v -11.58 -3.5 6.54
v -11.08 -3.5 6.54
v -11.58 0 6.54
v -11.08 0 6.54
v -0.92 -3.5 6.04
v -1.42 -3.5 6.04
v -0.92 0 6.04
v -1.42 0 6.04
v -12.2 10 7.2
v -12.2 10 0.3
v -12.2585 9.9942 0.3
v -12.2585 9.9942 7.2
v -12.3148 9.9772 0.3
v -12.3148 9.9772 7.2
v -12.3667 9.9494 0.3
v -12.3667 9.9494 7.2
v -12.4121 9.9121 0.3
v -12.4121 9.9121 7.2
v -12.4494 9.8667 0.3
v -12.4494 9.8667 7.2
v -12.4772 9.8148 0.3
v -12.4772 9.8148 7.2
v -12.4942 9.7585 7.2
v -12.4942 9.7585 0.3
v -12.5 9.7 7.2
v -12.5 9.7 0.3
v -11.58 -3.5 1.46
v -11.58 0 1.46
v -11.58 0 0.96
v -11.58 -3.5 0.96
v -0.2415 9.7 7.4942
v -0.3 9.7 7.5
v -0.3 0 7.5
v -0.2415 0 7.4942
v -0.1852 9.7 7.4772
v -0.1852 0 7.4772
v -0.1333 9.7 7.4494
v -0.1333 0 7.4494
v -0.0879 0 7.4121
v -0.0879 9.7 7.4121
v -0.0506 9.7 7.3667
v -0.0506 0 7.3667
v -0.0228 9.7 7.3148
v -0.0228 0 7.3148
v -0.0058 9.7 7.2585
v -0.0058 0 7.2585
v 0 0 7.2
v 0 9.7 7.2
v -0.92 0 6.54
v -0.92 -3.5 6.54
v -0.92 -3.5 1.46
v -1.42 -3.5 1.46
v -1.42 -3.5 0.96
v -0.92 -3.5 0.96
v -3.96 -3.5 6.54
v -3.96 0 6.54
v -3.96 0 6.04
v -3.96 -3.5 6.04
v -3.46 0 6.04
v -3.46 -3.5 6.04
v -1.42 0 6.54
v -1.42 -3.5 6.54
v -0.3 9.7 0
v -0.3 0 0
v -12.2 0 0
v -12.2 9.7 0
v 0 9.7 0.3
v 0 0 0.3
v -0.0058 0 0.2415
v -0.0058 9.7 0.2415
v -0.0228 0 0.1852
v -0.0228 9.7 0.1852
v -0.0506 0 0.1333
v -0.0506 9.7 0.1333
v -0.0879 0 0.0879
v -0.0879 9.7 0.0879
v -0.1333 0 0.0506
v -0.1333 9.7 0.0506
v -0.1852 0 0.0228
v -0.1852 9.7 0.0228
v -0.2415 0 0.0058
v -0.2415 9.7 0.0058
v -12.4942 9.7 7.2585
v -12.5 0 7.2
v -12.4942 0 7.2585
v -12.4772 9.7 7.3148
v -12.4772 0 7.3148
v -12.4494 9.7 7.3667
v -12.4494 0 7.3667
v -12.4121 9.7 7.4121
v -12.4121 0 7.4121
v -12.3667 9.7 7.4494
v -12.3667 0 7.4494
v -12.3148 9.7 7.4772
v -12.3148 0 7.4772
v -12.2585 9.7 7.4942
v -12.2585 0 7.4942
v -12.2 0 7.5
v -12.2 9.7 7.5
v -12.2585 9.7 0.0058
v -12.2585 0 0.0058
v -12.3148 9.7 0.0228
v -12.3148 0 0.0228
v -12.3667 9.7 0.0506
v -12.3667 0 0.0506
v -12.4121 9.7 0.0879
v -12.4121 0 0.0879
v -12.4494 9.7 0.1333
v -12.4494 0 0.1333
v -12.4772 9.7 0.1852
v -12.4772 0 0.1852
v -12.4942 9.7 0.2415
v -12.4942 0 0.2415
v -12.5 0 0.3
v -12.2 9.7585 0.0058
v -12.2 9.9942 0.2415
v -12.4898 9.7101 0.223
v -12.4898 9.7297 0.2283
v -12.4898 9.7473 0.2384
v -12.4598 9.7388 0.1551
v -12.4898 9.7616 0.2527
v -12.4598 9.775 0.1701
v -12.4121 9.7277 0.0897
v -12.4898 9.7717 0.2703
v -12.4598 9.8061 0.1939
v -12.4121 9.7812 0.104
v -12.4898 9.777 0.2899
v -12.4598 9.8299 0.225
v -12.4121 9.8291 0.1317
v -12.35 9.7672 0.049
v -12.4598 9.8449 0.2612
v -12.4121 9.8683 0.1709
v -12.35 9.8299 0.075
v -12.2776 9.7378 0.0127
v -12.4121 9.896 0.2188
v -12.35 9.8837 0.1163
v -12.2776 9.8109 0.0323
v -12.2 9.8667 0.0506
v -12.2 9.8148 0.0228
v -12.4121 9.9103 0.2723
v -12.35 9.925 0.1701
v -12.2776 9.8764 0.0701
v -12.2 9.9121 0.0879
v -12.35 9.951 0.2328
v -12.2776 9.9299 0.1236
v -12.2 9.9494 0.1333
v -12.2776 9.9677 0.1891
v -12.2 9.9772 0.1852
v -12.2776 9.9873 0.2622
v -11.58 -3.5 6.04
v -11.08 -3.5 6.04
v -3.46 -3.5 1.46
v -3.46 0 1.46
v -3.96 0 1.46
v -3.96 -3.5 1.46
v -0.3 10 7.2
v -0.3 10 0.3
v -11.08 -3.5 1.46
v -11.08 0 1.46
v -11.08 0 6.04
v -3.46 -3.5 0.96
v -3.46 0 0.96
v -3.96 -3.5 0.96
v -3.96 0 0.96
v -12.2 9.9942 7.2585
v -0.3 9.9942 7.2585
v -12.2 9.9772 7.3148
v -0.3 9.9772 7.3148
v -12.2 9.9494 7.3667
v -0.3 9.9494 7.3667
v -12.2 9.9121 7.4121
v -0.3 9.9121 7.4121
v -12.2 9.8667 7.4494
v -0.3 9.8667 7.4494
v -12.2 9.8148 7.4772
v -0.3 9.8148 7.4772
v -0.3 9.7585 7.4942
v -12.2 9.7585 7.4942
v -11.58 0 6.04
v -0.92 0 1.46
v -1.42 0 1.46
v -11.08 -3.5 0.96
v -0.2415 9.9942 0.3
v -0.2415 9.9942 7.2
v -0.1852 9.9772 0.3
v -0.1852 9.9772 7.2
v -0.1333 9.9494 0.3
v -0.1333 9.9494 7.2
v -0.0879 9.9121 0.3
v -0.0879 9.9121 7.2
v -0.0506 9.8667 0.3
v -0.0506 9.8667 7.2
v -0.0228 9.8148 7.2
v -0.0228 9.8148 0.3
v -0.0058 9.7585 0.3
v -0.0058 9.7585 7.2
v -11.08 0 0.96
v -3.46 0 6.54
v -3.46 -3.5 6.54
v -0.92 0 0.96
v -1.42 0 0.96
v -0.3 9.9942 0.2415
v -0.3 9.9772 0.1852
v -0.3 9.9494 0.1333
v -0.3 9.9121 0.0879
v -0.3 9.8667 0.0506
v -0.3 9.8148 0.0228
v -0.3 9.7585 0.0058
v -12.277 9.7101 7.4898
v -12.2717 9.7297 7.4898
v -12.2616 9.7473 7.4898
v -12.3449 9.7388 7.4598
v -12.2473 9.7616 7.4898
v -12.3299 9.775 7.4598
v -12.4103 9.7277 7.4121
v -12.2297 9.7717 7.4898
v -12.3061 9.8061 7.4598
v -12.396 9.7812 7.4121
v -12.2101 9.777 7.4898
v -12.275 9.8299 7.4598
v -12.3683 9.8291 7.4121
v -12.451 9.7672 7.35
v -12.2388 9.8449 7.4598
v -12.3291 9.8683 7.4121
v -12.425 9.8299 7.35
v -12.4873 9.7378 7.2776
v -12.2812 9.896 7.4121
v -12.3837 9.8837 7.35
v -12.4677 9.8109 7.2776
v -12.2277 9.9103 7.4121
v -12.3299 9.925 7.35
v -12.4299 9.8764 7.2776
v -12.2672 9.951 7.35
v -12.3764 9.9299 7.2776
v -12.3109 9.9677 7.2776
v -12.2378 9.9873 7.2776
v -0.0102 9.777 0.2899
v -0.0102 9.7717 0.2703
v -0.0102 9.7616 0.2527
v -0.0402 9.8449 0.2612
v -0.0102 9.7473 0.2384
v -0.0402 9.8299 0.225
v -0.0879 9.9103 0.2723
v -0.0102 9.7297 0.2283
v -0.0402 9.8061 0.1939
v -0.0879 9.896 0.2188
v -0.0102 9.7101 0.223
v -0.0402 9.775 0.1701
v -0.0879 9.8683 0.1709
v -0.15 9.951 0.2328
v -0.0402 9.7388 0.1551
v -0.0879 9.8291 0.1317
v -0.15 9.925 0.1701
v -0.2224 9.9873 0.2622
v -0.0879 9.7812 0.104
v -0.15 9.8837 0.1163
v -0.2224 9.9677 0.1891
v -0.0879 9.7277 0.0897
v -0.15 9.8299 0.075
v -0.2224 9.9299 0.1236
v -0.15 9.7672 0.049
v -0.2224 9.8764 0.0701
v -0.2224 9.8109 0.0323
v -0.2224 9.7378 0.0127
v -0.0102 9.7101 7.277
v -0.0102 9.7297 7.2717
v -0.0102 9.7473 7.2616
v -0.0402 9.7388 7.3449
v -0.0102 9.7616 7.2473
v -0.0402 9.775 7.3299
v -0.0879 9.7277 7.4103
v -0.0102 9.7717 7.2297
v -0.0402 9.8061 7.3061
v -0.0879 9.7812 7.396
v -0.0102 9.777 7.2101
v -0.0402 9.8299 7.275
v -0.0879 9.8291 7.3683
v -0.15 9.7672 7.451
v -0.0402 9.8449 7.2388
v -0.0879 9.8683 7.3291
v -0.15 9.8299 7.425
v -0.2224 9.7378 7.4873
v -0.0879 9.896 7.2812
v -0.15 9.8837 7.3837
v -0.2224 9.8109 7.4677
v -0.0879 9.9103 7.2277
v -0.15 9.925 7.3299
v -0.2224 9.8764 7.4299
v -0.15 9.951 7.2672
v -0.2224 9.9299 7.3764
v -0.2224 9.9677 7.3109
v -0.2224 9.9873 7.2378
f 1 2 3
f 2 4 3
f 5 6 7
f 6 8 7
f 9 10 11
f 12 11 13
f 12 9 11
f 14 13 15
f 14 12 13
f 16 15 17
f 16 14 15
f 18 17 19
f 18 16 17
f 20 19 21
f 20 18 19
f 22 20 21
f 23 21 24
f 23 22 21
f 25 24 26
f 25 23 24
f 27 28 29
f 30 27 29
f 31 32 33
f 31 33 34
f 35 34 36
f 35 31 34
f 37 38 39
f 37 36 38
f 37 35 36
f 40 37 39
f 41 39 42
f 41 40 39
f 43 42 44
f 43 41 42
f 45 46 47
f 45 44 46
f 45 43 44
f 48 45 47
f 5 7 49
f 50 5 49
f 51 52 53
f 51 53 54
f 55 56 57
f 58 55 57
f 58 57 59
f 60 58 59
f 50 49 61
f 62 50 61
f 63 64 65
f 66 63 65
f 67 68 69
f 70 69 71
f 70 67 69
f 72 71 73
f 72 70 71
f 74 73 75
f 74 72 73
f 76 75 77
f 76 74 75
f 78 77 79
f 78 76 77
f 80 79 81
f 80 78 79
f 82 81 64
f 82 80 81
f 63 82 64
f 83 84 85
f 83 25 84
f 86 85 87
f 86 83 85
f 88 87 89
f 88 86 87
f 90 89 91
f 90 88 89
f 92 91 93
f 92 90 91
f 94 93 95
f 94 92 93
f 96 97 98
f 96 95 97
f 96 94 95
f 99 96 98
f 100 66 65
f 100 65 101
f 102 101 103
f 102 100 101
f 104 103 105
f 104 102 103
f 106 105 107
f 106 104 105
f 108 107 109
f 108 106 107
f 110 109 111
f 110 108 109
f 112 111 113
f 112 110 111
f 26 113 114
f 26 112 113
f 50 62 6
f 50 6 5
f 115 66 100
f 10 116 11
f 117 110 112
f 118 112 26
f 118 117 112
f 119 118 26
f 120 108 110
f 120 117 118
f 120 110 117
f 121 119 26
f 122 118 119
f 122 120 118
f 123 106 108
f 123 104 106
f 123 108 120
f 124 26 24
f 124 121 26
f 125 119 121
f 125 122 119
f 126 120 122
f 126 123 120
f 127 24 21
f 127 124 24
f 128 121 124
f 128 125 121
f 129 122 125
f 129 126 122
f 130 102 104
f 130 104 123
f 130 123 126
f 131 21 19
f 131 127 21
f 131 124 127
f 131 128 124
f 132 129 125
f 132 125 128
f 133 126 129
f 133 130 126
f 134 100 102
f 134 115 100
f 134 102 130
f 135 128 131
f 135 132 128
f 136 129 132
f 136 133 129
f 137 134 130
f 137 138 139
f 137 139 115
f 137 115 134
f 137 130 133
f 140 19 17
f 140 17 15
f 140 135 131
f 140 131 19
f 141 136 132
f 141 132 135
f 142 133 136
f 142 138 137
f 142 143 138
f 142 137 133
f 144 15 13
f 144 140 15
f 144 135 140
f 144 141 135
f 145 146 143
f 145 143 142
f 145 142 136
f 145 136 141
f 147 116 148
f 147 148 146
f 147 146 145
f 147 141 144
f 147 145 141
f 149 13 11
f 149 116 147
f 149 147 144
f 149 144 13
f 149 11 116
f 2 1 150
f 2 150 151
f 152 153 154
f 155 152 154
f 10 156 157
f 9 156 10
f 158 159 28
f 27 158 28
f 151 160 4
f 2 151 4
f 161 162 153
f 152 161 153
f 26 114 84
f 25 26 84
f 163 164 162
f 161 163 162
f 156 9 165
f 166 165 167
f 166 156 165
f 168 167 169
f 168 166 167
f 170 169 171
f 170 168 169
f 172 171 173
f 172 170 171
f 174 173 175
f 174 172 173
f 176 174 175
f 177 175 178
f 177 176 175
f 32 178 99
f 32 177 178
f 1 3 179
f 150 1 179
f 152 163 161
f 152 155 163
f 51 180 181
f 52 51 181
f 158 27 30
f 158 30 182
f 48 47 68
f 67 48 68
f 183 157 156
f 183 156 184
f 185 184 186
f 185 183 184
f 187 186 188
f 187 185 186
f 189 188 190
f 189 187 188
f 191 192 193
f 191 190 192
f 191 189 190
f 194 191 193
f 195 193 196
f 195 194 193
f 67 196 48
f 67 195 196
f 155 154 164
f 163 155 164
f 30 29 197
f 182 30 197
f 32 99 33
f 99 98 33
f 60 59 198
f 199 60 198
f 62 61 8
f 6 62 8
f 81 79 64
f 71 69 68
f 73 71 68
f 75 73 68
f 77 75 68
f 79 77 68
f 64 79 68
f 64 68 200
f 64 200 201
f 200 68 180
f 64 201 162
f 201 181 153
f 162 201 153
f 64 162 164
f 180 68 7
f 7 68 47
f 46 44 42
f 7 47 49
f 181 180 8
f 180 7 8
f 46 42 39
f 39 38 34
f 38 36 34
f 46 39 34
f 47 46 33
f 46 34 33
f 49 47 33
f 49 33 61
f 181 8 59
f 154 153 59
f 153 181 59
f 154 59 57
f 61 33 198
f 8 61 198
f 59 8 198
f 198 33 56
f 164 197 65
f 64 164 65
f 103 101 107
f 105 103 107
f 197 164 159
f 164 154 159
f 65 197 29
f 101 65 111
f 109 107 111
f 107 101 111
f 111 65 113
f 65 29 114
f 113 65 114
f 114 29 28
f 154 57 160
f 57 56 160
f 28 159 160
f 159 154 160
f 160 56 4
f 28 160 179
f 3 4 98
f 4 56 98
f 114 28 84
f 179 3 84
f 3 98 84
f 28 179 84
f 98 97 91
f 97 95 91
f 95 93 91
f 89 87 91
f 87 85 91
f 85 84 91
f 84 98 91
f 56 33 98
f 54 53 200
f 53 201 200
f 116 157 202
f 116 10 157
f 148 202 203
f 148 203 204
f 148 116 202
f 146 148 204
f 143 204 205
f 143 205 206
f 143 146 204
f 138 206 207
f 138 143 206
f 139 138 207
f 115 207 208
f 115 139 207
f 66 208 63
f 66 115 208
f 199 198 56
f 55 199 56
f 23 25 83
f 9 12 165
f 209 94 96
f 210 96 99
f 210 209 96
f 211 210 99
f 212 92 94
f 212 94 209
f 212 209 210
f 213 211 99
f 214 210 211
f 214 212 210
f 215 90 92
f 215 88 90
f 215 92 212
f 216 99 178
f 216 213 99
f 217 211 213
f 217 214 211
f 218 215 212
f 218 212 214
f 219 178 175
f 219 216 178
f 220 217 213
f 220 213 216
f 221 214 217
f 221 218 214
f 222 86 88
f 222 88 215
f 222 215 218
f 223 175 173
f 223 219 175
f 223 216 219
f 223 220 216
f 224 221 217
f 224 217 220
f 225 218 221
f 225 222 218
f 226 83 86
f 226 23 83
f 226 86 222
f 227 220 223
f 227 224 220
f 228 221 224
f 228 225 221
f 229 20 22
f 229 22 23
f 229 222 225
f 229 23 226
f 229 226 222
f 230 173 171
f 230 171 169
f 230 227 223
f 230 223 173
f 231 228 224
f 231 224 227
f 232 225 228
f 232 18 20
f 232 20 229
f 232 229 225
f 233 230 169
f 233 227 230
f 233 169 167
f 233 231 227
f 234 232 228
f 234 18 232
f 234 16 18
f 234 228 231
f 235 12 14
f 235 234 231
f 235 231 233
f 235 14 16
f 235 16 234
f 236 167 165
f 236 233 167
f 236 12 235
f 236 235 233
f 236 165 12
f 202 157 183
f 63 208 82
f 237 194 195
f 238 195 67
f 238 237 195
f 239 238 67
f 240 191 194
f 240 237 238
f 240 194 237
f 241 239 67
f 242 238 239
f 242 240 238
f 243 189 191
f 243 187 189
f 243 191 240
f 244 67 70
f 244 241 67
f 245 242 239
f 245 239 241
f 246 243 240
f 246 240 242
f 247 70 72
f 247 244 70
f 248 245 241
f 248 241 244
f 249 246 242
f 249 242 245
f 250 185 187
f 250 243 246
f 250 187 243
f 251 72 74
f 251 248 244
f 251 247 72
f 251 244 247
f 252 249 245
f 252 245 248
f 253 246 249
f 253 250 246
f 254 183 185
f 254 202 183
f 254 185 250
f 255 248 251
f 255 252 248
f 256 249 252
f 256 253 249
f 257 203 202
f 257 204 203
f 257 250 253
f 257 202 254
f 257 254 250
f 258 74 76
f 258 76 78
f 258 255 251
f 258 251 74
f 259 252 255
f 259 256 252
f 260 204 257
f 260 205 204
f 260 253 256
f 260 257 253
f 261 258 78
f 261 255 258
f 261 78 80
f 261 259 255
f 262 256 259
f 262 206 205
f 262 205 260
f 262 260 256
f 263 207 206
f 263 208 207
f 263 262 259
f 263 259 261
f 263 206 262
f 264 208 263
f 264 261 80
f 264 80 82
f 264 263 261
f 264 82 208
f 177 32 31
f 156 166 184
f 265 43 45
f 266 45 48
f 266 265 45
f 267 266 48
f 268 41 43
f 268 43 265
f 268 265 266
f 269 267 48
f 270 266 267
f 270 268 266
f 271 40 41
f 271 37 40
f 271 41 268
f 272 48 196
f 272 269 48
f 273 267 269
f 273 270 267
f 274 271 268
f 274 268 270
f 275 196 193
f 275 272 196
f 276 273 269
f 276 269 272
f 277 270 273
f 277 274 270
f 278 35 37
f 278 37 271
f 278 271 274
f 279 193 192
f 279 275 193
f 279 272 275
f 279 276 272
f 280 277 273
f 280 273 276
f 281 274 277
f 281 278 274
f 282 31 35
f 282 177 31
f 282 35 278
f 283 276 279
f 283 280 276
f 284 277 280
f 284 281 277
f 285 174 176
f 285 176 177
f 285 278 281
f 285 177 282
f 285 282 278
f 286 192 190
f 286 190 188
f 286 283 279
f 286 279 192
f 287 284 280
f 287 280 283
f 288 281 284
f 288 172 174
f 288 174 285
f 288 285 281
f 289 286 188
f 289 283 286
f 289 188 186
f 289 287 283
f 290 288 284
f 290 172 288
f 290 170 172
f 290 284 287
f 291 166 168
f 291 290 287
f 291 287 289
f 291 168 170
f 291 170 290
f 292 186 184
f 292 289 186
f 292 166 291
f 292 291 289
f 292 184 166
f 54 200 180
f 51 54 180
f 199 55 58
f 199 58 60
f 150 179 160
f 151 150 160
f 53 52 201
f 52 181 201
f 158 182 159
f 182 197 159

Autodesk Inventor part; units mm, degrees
ref_plane "YZ Plane" through (0, 0, 0) normal (1, 0, 0) x (0, 1, 0)
ref_plane "XZ Plane" through (0, 0, 0) normal (0, 1, 0) x (-1, 0, 0)
ref_plane "XY Plane" through (0, 0, 0) normal (0, 0, 1) x (1, 0, 0)
sketch "Эскиз1" plane through (0, 0, 0) normal (0, 1, 0) x (-1, 0, 0)
  line L0 (0, 0) -> (12.5, 0)
  line L1 (12.5, 0) -> (12.5, 7.5)
  line L2 (12.5, 7.5) -> (0, 7.5)
  line L3 (0, 7.5) -> (0, 0)
  dimension "d0" = 12.5
  dimension "d1" = 7.5
extrude "Выдавливание1" add sketch "Эскиз1" along normal blind 10
sketch "Эскиз2" plane through (0, 0, 0) normal (0, -1, 0) x (1, 0, 0)
  line L0 (-1.42, 0.96) -> (-0.92, 0.96)
  line L1 (-0.92, 0.96) -> (-0.92, 1.46)
  line L2 (-0.92, 1.46) -> (-1.42, 1.46)
  line L3 (-1.42, 1.46) -> (-1.42, 0.96)
  line L4 (0, 0) -> (-12.5, 0) projected
  line L5 (0, 7.5) -> (0, 0) projected
  line L6 (-3.96, 0.96) -> (-3.46, 0.96)
  line L7 (-3.46, 0.96) -> (-3.46, 1.46)
  line L8 (-3.46, 1.46) -> (-3.96, 1.46)
  line L9 (-3.96, 1.46) -> (-3.96, 0.96)
  line L10 (-1.42, 6.04) -> (-0.92, 6.04)
  line L11 (-0.92, 6.04) -> (-0.92, 6.54)
  line L12 (-0.92, 6.54) -> (-1.42, 6.54)
  line L13 (-1.42, 6.54) -> (-1.42, 6.04)
  line L14 (-3.96, 6.04) -> (-3.46, 6.04)
  line L15 (-3.46, 6.04) -> (-3.46, 6.54)
  line L16 (-3.46, 6.54) -> (-3.96, 6.54)
  line L17 (-3.96, 6.54) -> (-3.96, 6.04)
  line L18 (-11.58, 6.04) -> (-11.08, 6.04)
  line L19 (-11.08, 6.54) -> (-11.58, 6.54)
  line L20 (-11.58, 6.54) -> (-11.58, 6.04)
  line L21 (-11.08, 6.04) -> (-11.08, 6.54)
  line L22 (-11.08, 1.46) -> (-11.58, 1.46)
  line L23 (-11.08, 0.96) -> (-11.08, 1.46)
  line L24 (-11.58, 1.46) -> (-11.58, 0.96)
  line L25 (-11.58, 0.96) -> (-11.08, 0.96)
  dimension "d4" = 0.5
  dimension "d5" = 0.5
  dimension "d7" = 0.96
  dimension "d8" = 0.92
  dimension "d11" = 2.54
  dimension "d14" = 5.08
  dimension "d19" = 7.62
extrude "Выдавливание2" add sketch "Эскиз2" along normal blind 3.5
fillet "Сопряжение1" radius 0.3 8 edges at (-6.25, 10, 0) (-12.5, 10, 3.75) (-6.25, 10, 7.5) (0, 10, 3.75) (0, 5, 7.5) (0, 5, 0) (-12.5, 5, 0) (-12.5, 5, 7.5)
properties part number "NRP03K"
